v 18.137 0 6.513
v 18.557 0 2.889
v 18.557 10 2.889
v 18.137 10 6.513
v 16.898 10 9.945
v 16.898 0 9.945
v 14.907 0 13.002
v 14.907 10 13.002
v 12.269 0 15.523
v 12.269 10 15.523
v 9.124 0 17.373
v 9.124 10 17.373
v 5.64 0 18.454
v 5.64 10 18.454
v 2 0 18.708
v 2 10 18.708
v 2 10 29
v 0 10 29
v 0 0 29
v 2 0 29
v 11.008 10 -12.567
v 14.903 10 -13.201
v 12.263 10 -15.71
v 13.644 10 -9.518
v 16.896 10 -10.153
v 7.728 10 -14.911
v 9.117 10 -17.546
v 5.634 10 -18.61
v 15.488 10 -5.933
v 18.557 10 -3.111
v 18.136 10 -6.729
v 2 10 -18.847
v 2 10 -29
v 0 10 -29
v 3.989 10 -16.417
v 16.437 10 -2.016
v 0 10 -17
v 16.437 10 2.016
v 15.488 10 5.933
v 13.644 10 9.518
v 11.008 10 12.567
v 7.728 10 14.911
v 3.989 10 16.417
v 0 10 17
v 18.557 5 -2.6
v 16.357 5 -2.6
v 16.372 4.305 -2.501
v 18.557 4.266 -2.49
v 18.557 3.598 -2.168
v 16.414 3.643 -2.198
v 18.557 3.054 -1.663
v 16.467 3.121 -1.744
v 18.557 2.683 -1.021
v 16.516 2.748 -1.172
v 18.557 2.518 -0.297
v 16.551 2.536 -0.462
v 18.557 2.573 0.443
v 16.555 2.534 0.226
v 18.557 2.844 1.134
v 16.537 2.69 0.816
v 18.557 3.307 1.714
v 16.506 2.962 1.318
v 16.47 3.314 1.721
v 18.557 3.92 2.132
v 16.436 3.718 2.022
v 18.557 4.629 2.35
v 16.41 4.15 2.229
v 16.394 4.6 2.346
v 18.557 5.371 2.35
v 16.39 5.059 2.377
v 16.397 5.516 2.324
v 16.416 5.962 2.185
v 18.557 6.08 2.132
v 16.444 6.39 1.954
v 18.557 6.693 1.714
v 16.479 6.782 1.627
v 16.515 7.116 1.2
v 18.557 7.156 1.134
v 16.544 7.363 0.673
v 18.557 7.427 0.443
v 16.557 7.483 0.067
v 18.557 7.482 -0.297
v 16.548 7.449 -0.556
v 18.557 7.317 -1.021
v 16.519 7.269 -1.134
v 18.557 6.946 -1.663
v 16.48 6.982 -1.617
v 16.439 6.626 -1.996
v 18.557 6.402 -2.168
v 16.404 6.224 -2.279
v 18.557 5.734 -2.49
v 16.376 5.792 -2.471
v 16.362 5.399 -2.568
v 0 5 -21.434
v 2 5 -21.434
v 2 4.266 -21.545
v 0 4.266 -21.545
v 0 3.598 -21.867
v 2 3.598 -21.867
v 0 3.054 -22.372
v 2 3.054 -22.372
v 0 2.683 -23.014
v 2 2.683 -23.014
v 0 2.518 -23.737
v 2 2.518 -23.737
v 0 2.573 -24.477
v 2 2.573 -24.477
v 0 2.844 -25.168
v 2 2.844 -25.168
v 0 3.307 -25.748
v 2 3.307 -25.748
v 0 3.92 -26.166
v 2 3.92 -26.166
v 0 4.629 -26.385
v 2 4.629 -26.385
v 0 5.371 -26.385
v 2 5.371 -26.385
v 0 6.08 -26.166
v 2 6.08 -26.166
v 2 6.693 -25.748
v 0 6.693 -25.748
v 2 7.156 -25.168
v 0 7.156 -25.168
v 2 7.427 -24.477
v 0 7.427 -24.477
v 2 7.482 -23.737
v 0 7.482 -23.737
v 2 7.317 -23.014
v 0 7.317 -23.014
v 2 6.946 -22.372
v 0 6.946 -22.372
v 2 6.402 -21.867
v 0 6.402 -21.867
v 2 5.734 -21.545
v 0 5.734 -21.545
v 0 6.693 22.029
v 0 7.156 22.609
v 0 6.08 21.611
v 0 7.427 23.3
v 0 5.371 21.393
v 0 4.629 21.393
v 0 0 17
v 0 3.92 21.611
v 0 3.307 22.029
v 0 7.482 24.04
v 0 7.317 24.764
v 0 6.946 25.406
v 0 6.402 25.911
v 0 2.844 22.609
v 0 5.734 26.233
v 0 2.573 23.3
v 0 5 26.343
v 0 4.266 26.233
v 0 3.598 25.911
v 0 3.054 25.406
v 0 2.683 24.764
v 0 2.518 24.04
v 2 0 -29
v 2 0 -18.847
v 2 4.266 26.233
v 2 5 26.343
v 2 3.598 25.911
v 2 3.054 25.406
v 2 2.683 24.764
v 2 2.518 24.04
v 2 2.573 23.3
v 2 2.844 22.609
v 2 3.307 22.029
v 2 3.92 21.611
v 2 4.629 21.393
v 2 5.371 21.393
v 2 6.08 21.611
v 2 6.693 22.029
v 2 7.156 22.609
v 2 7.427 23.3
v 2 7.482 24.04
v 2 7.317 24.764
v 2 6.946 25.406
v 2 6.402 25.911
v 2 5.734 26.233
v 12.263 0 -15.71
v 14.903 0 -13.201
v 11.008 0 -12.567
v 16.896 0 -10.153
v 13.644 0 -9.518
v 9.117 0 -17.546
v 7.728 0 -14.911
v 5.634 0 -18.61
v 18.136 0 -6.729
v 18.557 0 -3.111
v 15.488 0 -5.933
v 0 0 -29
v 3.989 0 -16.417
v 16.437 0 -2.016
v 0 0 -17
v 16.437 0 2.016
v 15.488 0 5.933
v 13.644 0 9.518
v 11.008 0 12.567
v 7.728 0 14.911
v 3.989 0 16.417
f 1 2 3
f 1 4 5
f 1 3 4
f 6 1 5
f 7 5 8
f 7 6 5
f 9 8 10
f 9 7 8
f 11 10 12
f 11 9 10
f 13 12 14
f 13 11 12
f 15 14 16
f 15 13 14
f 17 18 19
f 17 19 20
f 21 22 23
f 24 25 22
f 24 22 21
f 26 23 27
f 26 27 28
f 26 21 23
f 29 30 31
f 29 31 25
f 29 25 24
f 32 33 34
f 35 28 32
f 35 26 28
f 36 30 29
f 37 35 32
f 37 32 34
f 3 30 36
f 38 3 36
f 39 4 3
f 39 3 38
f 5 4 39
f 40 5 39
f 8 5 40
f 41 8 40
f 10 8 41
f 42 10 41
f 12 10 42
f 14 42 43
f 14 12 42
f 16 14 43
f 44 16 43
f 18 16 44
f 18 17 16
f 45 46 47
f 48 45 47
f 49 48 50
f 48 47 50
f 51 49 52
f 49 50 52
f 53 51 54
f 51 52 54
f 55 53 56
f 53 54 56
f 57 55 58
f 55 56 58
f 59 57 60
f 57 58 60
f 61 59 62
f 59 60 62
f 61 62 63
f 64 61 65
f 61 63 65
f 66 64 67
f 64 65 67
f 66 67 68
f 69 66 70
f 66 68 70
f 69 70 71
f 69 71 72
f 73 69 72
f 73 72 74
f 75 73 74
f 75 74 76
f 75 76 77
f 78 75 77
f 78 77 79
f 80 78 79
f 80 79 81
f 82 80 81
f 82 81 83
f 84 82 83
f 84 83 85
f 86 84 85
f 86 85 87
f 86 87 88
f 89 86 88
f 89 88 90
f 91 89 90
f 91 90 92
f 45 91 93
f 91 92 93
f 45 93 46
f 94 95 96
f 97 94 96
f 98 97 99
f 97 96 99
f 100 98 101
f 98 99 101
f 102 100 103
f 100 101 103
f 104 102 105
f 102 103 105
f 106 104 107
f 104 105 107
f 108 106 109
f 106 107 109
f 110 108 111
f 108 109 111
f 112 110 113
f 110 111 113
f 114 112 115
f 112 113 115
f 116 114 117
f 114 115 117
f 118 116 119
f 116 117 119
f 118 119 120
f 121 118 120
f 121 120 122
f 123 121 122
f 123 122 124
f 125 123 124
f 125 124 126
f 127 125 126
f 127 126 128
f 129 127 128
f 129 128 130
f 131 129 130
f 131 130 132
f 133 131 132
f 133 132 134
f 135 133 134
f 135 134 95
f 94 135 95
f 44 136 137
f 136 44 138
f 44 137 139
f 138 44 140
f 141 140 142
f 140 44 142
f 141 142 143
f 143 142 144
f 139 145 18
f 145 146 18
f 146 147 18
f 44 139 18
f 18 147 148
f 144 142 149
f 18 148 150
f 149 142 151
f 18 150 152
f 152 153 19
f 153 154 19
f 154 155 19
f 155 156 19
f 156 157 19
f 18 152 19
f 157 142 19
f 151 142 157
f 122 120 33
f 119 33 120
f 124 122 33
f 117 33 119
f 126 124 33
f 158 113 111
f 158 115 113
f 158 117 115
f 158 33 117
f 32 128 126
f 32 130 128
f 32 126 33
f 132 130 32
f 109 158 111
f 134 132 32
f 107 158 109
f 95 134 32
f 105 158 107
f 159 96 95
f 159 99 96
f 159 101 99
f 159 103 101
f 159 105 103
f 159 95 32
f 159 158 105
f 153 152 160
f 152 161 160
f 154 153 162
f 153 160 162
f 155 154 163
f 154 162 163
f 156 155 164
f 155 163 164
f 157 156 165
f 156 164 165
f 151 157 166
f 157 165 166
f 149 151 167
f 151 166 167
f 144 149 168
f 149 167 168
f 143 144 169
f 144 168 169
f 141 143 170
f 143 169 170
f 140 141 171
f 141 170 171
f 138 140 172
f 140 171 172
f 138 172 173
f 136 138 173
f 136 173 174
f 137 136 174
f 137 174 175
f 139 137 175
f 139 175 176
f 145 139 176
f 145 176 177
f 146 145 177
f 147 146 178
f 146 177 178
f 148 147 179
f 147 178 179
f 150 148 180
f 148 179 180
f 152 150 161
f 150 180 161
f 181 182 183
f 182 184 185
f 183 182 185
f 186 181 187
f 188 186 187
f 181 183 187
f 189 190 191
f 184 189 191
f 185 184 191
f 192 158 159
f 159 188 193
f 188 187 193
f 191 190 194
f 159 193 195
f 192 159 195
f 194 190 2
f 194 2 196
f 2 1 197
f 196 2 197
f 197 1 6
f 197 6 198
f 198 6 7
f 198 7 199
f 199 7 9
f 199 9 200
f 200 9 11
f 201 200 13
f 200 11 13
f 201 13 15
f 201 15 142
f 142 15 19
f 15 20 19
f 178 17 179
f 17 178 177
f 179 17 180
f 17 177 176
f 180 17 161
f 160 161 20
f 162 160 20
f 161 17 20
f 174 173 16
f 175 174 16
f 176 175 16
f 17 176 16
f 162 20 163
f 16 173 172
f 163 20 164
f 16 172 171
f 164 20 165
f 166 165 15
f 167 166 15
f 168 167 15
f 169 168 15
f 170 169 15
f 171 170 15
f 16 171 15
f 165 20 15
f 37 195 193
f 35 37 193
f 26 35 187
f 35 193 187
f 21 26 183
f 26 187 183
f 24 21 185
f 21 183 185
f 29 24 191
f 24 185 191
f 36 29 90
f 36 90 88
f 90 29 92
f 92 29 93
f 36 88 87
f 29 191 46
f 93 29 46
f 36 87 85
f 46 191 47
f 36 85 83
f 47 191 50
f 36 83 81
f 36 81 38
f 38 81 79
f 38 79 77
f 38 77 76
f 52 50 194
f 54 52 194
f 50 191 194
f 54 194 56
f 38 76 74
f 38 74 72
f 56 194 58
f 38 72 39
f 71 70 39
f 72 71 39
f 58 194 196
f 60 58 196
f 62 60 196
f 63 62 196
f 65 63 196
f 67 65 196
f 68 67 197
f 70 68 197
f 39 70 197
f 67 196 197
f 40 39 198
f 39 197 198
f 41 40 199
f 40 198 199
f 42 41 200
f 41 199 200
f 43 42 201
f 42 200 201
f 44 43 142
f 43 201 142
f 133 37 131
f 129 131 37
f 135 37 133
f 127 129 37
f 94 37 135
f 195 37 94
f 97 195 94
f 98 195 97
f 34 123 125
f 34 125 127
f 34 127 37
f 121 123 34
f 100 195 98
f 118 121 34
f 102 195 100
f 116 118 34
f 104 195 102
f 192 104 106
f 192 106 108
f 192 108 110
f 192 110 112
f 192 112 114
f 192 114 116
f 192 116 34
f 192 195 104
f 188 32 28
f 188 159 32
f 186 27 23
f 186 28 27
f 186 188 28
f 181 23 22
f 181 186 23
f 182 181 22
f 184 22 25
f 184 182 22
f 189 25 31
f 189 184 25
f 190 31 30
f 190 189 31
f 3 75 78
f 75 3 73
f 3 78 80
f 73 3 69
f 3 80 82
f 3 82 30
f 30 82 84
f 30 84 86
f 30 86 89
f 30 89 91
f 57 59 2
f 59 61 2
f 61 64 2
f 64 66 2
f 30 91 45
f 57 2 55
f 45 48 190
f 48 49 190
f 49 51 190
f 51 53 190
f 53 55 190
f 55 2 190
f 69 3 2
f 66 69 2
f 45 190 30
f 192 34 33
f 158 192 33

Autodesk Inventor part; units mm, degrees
ref_plane "YZ Plane" through (0, 0, 0) normal (1, 0, 0) x (0, 1, 0)
ref_plane "XZ Plane" through (0, 0, 0) normal (0, 1, 0) x (-1, 0, 0)
sketch "Szkic1" plane through (0, 0, 0) normal (0, 1, 0) x (-1, 0, 0)
  line L0 (0, 17) -> (0, -17) construction
  line L1 (0, 0) -> (-17, 0)
  line L2 (0, 17) -> (0, 19)
  line L3 (0, -17) -> (0, -19)
  line L4 (-16.5569, 0) -> (-18.5569, 0)
  line L5 (0, 19) -> (0, 29)
  line L6 (0, 29) -> (-2, 29)
  line L7 (-2, 29) -> (-2, 18.7083)
  line L8 (0, -19) -> (0, -29)
  line L9 (0, -29) -> (-2, -29)
  line L10 (-2, -29) -> (-2, -18.8469)
  line L11 (-18.5573, 2.8889) -> (-18.5573, -3.1111)
  arc A0 (-2, 18.7083) -> (-18.5573, 2.8889) centre (-2.7215, 2.8889) ccw
  arc A1 (-18.5573, -3.1111) -> (-2, -18.8469) centre (-2.8011, -3.1111) ccw
  arc A2 (0, 17) -> (0, -17) centre (0.449, 0) ccw
  dimension "d0" = 34
  dimension "d1" = 17
  dimension "d2" = 2
  dimension "d3" = 2
  dimension "d4" = 2
  dimension "d5" = 10
  dimension "d6" = 2
  dimension "d7" = 10
  dimension "d8" = 2
  dimension "d41" = 6
ref_plane "Płaszczyzna konstrukcyjna1" through (0, 0, 17) normal (-1, 0, 0) x (0, 0, 1)
extrude "Wyciągnięcie proste3" add sketch "Szkic1" along normal blind 10
sketch "Szkic4" plane through (0, 0, -29) normal (-1, 0, 0) x (0, 0, 1)
  line L0 (10.1531, 0) -> (10.1531, 10) projected
  line L1 (10.1531, 5) -> (0, 5) construction
  line L2 (0, 0) -> (0, 10) projected
  line L3 (10.1531, 10) -> (0, 10) projected
  line L4 (5.0765, 10) -> (5.0765, 0) construction
  line L5 (10.1531, 0) -> (0, 0) projected
  line L6 (47.7083, 0) -> (47.7083, 10) projected
  line L7 (47.7083, 5) -> (58, 5) construction
  line L8 (58, 0) -> (58, 10) projected
  line L9 (46, 10) -> (58, 10) projected
  line L10 (52.8541, 10) -> (52.8541, 0) construction
  circle A0 centre (52.8541, 5) radius 3
  circle A1 centre (5.0765, 5) radius 3
  point P0 (29, 0)
  dimension "d45" = 6
  dimension "d46" = 6
hole "Otwór4" at (0, 5, -23.9235) at (0, 5, 23.8541) direction (1, 0, 0) diameter 4.9784 depth 19.05 tip angle 118 thread size "1/4-20 UNC" class "2B" standard "ANSI Unified Screw Threads"
sketch "Szkic5" plane through (18.5573, 0, 2.8889) normal (1, 0, 0) x (0, 0, -1)
  line L0 (0, 10) -> (6, 10) projected
  line L1 (3, 10) -> (3, 0)
  line L2 (0, 0) -> (6, 0) projected
  line L3 (0, 0) -> (0, 10) projected
  line L4 (0, 5) -> (6, 5)
  line L5 (6, 0) -> (6, 10) projected
  circle A0 centre (3, 5) radius 3
  point P0 (2.8889, 0)
  dimension "d54" = 6
hole "Otwór5" at (18.5573, 5, -0.1111) direction (-1, 0, 0) diameter 4.9784 depth 19.05 tip angle 118 thread size "1/4-20 UNC" class "2B" standard "ANSI Unified Screw Threads"
properties part number "obejma_fi32_L44"
